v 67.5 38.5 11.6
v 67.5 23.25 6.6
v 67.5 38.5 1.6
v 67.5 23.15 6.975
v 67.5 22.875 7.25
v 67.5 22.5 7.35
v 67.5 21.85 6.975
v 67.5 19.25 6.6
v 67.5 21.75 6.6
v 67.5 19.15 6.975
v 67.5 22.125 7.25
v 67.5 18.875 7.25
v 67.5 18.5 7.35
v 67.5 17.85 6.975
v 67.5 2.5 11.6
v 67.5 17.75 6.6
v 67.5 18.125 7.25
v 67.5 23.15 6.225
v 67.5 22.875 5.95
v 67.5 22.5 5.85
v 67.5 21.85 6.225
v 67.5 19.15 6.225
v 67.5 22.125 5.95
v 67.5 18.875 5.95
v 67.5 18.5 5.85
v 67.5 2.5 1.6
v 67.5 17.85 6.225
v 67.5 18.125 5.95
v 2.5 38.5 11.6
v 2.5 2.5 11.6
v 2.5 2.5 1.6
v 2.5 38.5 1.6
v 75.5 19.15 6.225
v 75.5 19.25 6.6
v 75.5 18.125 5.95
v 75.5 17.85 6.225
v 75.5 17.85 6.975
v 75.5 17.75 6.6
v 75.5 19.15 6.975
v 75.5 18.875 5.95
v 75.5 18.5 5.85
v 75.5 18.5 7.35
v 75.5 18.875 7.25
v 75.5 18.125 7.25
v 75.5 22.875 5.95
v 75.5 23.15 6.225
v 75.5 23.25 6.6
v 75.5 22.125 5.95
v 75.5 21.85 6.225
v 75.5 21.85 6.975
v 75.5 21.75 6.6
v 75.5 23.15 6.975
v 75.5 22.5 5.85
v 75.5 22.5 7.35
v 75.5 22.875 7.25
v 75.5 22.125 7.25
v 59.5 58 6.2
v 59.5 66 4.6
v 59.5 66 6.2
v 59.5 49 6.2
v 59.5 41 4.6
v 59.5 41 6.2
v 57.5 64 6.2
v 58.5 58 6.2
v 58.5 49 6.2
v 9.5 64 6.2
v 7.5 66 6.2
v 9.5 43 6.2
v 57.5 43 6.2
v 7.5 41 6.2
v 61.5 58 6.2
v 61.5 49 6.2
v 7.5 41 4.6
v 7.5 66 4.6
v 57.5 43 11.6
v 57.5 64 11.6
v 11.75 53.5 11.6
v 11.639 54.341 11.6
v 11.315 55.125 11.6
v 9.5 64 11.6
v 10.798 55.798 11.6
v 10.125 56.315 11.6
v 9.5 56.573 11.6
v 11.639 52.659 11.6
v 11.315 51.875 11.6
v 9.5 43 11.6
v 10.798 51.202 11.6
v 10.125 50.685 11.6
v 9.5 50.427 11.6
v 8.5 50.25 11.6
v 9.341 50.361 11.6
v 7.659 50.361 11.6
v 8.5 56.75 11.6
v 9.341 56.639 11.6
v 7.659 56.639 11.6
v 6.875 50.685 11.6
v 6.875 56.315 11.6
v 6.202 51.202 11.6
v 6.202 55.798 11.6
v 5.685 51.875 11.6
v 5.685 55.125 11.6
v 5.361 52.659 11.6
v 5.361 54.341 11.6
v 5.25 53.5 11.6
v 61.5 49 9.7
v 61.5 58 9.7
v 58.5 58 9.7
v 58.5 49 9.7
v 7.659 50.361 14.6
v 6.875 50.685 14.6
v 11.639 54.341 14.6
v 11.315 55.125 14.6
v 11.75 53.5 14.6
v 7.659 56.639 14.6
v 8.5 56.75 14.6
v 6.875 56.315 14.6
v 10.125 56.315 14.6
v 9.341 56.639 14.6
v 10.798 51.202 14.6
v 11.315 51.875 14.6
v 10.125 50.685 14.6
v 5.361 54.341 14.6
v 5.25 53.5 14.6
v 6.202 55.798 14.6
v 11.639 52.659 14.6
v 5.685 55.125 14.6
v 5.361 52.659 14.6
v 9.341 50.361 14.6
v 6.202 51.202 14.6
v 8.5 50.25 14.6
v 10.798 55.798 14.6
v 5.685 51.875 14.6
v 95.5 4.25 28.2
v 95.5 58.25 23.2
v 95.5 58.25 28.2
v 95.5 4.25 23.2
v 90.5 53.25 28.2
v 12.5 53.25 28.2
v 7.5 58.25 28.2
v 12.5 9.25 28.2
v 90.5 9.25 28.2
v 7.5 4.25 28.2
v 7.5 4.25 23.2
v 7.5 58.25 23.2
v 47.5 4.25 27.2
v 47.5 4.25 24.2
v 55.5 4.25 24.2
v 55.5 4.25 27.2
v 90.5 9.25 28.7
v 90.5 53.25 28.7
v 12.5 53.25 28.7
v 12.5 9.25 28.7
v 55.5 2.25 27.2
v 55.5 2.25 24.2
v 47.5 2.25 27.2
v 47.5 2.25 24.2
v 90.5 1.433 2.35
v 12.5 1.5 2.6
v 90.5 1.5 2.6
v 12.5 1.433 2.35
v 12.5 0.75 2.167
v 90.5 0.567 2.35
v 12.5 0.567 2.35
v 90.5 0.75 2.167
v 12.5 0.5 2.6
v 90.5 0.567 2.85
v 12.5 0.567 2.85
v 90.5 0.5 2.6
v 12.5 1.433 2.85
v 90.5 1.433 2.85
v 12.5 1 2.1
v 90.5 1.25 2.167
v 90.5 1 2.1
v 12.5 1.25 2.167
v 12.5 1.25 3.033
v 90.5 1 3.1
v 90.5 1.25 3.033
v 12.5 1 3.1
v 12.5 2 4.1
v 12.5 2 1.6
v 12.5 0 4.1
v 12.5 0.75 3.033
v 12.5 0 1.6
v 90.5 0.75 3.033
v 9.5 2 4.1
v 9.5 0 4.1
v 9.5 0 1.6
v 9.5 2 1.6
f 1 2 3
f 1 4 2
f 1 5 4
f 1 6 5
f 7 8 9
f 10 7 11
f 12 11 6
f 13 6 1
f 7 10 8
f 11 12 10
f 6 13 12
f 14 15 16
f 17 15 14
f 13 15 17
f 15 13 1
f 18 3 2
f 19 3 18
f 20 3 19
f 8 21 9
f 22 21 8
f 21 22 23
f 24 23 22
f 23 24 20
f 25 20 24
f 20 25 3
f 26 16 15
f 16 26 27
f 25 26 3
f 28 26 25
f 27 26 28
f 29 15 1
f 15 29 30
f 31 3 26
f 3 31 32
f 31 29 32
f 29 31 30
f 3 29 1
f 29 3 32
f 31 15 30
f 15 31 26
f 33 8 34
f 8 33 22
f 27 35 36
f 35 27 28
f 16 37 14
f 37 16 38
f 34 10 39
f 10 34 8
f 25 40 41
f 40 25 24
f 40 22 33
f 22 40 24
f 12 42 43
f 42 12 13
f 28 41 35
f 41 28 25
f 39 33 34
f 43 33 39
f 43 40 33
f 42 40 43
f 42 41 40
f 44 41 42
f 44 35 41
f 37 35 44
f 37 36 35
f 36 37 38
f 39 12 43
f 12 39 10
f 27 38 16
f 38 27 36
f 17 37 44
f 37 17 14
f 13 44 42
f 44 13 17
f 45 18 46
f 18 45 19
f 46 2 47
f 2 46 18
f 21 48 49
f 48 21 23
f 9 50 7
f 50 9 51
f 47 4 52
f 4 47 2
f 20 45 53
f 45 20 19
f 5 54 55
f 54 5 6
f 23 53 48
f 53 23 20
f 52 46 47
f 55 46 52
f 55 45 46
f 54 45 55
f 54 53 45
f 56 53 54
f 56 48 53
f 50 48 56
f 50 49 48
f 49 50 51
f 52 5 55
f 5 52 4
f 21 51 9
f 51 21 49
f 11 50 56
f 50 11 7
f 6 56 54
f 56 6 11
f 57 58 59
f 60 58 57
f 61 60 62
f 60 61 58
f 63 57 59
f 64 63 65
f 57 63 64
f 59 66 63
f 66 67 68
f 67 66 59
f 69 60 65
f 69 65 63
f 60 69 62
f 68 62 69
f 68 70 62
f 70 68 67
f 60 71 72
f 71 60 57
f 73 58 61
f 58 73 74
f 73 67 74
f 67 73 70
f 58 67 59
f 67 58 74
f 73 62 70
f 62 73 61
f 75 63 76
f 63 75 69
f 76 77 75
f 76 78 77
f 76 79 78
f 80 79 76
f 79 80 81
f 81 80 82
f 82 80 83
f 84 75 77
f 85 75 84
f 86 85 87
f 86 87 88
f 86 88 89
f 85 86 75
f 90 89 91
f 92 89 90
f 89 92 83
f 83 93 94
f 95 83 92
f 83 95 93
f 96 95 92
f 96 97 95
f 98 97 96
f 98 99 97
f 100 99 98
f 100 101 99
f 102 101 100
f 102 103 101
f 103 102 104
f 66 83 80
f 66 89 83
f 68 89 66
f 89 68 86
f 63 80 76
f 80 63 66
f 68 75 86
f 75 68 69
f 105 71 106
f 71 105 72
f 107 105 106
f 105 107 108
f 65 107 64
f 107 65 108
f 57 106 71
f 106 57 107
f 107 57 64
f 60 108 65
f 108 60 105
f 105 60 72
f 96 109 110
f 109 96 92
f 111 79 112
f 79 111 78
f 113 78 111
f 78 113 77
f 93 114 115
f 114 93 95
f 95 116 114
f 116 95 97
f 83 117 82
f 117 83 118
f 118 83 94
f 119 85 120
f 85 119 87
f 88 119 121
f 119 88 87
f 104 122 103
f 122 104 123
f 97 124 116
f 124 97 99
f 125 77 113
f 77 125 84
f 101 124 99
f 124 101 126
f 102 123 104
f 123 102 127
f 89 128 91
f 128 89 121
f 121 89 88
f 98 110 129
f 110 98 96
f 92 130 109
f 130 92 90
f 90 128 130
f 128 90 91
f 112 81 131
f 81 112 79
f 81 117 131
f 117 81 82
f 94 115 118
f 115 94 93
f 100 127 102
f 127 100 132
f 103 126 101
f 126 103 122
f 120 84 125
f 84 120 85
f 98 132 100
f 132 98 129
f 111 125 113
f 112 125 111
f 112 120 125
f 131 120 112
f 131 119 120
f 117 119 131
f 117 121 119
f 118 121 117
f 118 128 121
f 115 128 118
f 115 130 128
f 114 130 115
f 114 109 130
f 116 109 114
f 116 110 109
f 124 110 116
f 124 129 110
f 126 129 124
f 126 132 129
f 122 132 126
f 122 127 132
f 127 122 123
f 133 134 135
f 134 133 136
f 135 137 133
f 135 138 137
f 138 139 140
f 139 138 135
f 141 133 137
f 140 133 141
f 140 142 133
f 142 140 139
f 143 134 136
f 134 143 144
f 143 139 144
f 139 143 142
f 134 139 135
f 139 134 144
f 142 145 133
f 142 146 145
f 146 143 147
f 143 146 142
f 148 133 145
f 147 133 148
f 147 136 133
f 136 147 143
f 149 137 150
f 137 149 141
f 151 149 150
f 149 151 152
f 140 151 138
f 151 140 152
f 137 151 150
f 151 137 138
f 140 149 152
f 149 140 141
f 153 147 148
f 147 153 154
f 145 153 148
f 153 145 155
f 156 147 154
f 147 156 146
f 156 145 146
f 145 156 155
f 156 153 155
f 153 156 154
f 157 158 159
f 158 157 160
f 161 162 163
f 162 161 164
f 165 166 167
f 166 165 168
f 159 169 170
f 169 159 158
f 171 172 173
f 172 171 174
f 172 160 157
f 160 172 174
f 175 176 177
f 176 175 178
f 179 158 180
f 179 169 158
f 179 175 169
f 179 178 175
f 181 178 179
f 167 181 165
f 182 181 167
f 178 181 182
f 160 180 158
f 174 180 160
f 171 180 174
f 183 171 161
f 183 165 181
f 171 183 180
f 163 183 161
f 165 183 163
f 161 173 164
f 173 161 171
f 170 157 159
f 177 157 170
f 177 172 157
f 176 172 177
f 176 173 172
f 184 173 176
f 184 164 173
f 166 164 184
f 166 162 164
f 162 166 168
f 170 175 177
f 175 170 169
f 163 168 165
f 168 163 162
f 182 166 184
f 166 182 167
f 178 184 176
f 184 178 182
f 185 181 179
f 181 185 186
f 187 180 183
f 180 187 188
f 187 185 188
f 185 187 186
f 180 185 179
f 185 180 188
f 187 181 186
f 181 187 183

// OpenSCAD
// =============================================================================
// Altoids Mesh Enclosure — Component Models
// =============================================================================
// Approximate shapes of the real components for fit-check visualisation.
// These are NOT part of the printable enclosure.
// =============================================================================

include <parameters.scad>

// ----- Heltec WiFi LoRa 32 V4 ------------------------------------------------
module heltec_v4() {
    color("darkgreen", 0.8) {
        // PCB
        cube([heltec_len, heltec_wid, heltec_pcb_t]);
        // Components on top
        translate([2, 2, heltec_pcb_t])
            cube([heltec_len - 4, heltec_wid - 4,
                  heltec_ht - heltec_pcb_t]);
    }
    // OLED display
    color("black", 0.9)
        translate([heltec_oled_off_x, heltec_oled_off_y, heltec_ht - 0.5])
            cube([heltec_oled_w, heltec_oled_h, 0.5]);
    // USB-C port
    color("silver", 0.9)
        translate([heltec_len - 1,
                   heltec_usbc_off_y - heltec_usbc_w / 2,
                   heltec_pcb_t])
            cube([3, heltec_usbc_w, heltec_usbc_h]);
    // SMA antenna connector
    color("gold", 0.9)
        translate([1, heltec_wid / 2, heltec_ht])
            cylinder(d = heltec_antenna_dia, h = 3, $fn = 24);
}

// ----- M5Stack CardKB Unit 1.1 -----------------------------------------------
module cardkb_unit() {
    color("dimgray", 0.8)
        cube([cardkb_len, cardkb_wid, cardkb_ht]);
    // Key area
    color("darkslategray", 0.9)
        translate([5, 5, cardkb_ht])
            cube([cardkb_len - 10, cardkb_wid - 10, 0.5]);
    // Grove connector
    color("white", 0.9)
        translate([cardkb_cable_off - cardkb_cable_w / 2, -2, 1])
            cube([cardkb_cable_w, 4, 3]);
}

// ----- MakerFocus 3000 mAh Battery -------------------------------------------
module battery_3000mah() {
    color("steelblue", 0.7)
        cube([batt_len, batt_wid, batt_ht]);
    // Wire leads
    color("red", 0.9)
        translate([batt_len, batt_wid / 2 - 2, batt_ht / 2])
            rotate([0, 90, 0])
                cylinder(d = 1.5, h = batt_wire_clr, $fn = 12);
    color("black", 0.9)
        translate([batt_len, batt_wid / 2 + 2, batt_ht / 2])
            rotate([0, 90, 0])
                cylinder(d = 1.5, h = batt_wire_clr, $fn = 12);
}

// ----- Internal LoRa Wire Antenna --------------------------------------------
module internal_antenna() {
    color("silver", 0.9) {
        translate([2, ant_chan_w / 2, 1])
            rotate([0, 90, 0])
                cylinder(d = 1.0, h = ant_len - 4, $fn = 12);
        translate([-1, 0, 0])
            cube([3, ant_chan_w, 2.5]);
    }
}

// ----- Paper-Clip Hinge Pin --------------------------------------------------
module hinge_pin() {
    color("silver", 0.8)
        translate([hinge_margin - 2, 0, 0])
            rotate([0, 90, 0])
                cylinder(d = hinge_pin_d, h = hinge_span + 4, $fn = 16);
}

// ----- Full Component Assembly (for preview) ---------------------------------
module component_assembly() {
    // Battery
    translate([batt_pos_x, batt_pos_y, batt_pos_z])
        battery_3000mah();
    // Heltec V4
    translate([heltec_pos_x, heltec_pos_y, heltec_pos_z])
        heltec_v4();
    // CardKB (shown above case for reference)
    translate([cardkb_pos_x, cardkb_pos_y,
               case_ext_depth + lid_ext_depth + 2])
        cardkb_unit();
    // Internal LoRa antenna
    translate([ant_pos_x, ant_pos_y, floor_t])
        internal_antenna();
}

// Preview when opened directly
component_assembly();
